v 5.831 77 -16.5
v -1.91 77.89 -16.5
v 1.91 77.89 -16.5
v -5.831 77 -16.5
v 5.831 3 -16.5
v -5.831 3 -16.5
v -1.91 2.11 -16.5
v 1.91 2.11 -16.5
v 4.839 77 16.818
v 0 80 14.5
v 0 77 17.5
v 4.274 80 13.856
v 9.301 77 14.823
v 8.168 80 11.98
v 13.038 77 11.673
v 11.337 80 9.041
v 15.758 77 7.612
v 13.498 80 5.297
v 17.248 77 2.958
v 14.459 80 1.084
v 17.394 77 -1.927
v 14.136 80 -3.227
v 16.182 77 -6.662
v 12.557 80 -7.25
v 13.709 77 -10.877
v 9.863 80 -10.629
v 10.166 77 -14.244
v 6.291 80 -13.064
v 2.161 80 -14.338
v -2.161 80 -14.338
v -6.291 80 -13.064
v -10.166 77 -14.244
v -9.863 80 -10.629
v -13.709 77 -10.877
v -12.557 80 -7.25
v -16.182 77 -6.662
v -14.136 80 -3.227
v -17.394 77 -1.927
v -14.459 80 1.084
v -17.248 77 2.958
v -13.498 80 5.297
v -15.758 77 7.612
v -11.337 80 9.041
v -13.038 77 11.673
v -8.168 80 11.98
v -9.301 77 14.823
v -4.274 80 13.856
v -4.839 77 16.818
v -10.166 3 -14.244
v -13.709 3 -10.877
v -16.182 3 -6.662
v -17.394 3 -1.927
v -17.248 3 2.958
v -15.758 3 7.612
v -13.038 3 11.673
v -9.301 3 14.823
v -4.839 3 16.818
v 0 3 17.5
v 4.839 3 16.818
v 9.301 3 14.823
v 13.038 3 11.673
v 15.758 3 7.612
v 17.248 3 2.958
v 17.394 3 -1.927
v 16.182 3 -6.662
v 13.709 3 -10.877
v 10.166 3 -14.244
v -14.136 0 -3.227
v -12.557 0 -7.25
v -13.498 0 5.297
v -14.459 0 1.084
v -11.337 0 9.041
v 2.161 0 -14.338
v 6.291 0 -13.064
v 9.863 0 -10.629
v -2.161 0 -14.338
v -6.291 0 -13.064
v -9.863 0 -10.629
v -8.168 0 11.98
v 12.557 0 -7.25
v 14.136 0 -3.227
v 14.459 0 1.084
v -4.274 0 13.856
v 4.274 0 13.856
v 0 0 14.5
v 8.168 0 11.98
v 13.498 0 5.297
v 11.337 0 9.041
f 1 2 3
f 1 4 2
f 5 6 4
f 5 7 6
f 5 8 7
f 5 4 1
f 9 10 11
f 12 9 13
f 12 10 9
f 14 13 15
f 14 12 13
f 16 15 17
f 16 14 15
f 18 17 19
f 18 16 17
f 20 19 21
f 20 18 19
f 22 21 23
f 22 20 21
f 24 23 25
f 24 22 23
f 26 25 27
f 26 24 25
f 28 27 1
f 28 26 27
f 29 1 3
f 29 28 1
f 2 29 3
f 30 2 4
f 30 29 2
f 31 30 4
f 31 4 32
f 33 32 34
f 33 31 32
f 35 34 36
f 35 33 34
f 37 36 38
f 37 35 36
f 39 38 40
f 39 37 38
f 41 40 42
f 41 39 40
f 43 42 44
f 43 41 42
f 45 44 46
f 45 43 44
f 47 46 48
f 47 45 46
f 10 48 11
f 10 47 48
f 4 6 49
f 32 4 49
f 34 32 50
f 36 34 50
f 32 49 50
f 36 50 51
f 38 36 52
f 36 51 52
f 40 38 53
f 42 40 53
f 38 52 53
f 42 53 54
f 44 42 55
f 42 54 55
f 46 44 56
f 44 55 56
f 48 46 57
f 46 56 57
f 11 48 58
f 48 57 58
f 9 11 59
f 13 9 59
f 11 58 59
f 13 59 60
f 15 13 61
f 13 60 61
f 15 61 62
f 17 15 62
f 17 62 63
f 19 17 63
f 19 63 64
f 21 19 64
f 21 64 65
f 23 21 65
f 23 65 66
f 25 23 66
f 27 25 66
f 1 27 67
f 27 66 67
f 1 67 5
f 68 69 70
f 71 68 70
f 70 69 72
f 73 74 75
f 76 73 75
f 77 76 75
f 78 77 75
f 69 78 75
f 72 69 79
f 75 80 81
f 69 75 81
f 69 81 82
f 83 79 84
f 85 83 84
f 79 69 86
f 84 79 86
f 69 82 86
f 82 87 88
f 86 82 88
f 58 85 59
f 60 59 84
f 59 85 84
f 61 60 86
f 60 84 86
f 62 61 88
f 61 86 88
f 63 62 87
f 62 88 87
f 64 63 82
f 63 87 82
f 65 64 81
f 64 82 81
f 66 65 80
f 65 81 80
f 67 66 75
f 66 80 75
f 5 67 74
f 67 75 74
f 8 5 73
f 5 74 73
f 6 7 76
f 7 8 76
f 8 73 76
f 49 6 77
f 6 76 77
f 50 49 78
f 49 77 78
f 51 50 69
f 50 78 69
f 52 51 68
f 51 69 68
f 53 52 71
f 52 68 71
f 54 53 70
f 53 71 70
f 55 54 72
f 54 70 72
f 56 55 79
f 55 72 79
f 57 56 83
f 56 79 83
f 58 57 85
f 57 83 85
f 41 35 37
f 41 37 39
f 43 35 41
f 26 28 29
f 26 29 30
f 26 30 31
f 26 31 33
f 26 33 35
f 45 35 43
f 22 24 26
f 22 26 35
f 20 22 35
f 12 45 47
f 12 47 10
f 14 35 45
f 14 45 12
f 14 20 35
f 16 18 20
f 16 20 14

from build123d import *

# Parameters (mm, degrees)
SKETCH1_R               = 17.5
BOSS_EXTRUDE1_DEPTH     = 80
CHAMFER1_SIZE           = 3
CUT_EXTRUDE1_DEPTH      = 84.740671122
CUT_EXTRUDE1_DEPTH_BACK = 84.740671122
SKETCH2_W               = 35
SKETCH2_H               = 5


with BuildPart() as part:
    # Sketch1 → Boss-Extrude1 (new body)
    with BuildSketch(Plane(origin=(0, 0, 0), x_dir=(1, 0, 0), z_dir=(0, 1, 0))):
        with Locations(Location((0, 0, 0), (0, 0, 270))):
            Circle(SKETCH1_R)
    extrude(amount=BOSS_EXTRUDE1_DEPTH)

    # Chamfer1
    chamfer1_edges = [part.edges().sort_by_distance(p)[0] for p in [
        (0, 0, -17.5),
        (0, 80, -17.5),
    ]]
    chamfer(chamfer1_edges, length=CHAMFER1_SIZE)

    # Sketch2 → Cut-Extrude1 (cut, two sides: drawn at the far end of the back side and taken through both)
    with BuildSketch(Plane(origin=(0, 0, 0), x_dir=(1, 0, 0), z_dir=(0, 1, 0)).offset(-CUT_EXTRUDE1_DEPTH_BACK)):
        with Locations((0, 19)):
            Rectangle(SKETCH2_W, SKETCH2_H)
    extrude(amount=CUT_EXTRUDE1_DEPTH + CUT_EXTRUDE1_DEPTH_BACK, mode=Mode.SUBTRACT)


solid = part.part
